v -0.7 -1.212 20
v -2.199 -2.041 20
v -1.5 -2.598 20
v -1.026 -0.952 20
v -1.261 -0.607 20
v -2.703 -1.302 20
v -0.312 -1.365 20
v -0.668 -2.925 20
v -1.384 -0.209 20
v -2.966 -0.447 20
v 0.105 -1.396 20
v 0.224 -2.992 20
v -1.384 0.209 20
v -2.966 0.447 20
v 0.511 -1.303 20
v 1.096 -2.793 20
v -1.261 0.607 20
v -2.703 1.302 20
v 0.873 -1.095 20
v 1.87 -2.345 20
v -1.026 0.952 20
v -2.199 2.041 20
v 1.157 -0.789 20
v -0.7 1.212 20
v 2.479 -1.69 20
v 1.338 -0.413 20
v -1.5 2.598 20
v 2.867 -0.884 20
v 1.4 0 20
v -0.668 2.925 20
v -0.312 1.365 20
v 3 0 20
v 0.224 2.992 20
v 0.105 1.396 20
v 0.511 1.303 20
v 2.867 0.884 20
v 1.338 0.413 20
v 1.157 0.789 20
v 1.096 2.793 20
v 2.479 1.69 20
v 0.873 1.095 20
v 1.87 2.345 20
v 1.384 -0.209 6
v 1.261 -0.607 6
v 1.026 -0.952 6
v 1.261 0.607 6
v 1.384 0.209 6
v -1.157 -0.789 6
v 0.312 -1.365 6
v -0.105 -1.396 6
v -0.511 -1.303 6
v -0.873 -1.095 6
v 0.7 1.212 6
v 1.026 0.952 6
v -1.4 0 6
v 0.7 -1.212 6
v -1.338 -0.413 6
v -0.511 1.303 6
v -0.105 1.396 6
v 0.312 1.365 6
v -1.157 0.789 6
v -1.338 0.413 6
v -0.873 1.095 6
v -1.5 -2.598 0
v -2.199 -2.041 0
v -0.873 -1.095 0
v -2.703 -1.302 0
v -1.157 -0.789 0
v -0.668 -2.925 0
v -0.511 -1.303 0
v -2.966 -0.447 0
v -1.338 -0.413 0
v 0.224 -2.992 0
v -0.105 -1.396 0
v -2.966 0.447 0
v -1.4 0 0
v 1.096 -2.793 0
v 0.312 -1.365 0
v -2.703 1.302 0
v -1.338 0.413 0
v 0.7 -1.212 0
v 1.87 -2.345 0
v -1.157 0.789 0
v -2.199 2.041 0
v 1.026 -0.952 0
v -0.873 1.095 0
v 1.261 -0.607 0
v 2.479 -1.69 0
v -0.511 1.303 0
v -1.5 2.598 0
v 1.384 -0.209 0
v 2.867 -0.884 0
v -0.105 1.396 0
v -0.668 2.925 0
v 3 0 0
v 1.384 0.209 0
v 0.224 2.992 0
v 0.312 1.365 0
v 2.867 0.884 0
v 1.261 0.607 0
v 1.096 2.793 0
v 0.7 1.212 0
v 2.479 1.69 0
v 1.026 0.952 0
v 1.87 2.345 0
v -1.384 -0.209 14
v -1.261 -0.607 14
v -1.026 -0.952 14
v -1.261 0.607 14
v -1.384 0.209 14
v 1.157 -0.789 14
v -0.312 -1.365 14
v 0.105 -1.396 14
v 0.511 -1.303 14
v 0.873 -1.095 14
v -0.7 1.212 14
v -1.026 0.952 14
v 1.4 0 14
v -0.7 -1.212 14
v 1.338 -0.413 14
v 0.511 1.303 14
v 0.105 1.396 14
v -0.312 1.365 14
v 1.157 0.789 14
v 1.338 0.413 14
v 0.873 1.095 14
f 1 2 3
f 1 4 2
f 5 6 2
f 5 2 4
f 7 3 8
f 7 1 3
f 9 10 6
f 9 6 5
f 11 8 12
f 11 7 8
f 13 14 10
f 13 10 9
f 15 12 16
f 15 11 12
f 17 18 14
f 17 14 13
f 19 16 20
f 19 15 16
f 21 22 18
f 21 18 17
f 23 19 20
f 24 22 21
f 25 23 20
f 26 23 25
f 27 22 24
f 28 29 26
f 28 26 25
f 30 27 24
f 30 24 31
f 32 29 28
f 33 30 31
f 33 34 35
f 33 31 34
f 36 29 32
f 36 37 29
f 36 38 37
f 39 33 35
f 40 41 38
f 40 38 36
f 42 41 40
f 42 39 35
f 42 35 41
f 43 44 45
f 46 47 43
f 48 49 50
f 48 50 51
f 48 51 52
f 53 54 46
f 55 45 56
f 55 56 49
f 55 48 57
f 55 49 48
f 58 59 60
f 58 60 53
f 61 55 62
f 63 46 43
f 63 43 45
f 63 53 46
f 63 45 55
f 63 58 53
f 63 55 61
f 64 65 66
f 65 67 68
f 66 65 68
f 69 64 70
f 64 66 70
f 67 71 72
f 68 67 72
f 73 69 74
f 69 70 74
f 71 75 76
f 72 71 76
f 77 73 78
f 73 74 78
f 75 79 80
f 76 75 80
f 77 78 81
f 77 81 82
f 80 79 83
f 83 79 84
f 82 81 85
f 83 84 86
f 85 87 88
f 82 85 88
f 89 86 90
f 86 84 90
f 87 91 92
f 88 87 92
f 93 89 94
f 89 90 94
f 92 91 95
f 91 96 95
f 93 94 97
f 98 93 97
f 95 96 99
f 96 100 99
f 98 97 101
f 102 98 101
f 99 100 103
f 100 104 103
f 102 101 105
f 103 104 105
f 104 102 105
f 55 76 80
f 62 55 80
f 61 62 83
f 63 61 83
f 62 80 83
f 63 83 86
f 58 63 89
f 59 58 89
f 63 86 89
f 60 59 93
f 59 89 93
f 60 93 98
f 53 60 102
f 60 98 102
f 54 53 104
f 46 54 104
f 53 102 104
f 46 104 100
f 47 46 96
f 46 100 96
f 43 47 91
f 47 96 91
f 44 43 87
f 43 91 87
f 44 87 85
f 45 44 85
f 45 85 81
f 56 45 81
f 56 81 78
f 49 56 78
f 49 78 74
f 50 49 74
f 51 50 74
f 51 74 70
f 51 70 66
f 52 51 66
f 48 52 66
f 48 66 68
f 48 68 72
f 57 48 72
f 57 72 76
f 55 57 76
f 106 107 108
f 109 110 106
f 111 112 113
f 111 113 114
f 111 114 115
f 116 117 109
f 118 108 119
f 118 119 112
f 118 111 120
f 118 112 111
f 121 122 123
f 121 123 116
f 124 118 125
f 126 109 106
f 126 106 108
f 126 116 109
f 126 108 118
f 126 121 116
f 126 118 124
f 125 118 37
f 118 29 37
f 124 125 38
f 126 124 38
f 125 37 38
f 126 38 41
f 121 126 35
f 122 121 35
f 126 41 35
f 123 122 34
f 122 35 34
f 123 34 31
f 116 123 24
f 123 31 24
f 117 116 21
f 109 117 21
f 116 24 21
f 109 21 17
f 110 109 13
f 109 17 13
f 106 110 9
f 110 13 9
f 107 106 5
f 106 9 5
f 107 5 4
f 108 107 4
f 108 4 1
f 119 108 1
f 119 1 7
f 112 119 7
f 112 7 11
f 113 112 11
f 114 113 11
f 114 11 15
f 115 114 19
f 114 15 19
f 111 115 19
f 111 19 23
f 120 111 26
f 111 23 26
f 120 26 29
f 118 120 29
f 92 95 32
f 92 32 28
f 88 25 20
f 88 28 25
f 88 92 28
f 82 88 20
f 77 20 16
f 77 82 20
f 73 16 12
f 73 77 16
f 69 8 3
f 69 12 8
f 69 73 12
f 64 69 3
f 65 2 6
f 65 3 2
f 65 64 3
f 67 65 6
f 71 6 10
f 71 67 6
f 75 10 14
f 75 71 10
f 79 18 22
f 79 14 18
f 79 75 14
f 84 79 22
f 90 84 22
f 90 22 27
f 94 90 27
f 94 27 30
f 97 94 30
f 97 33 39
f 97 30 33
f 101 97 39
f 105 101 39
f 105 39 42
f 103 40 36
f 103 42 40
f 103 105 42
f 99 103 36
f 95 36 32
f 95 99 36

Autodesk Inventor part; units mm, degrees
ref_plane "YZ Plane" through (0, 0, 0) normal (1, 0, 0) x (0, 1, 0)
ref_plane "XZ Plane" through (0, 0, 0) normal (0, 1, 0) x (-1, 0, 0)
ref_plane "XY Plane" through (0, 0, 0) normal (0, 0, 1) x (1, 0, 0)
sketch "スケッチ1" plane through (0, 0, 0) normal (0, 0, 1) x (1, 0, 0)
  circle A0 centre (0, 0) radius 3
  dimension "d0" = 6
extrude "押し出し1" add sketch "スケッチ1" along normal blind 20
sketch "スケッチ2" plane through (0, 0, 20) normal (0, 0, 1) x (1, 0, 0)
  circle A0 centre (0, 0) radius 1.4
  dimension "d3" = 2.8
extrude "押し出し2" cut sketch "スケッチ2" against normal blind 6
sketch "スケッチ3" plane through (0, 0, 0) normal (0, 0, -1) x (-1, 0, 0)
  circle A0 centre (0, 0) radius 1.4 projected
  circle A1 centre (0, 0) radius 1.4
extrude "押し出し3" cut sketch "スケッチ3" against normal blind 6
properties part number "34mm" material "アルミニウム 6061"
